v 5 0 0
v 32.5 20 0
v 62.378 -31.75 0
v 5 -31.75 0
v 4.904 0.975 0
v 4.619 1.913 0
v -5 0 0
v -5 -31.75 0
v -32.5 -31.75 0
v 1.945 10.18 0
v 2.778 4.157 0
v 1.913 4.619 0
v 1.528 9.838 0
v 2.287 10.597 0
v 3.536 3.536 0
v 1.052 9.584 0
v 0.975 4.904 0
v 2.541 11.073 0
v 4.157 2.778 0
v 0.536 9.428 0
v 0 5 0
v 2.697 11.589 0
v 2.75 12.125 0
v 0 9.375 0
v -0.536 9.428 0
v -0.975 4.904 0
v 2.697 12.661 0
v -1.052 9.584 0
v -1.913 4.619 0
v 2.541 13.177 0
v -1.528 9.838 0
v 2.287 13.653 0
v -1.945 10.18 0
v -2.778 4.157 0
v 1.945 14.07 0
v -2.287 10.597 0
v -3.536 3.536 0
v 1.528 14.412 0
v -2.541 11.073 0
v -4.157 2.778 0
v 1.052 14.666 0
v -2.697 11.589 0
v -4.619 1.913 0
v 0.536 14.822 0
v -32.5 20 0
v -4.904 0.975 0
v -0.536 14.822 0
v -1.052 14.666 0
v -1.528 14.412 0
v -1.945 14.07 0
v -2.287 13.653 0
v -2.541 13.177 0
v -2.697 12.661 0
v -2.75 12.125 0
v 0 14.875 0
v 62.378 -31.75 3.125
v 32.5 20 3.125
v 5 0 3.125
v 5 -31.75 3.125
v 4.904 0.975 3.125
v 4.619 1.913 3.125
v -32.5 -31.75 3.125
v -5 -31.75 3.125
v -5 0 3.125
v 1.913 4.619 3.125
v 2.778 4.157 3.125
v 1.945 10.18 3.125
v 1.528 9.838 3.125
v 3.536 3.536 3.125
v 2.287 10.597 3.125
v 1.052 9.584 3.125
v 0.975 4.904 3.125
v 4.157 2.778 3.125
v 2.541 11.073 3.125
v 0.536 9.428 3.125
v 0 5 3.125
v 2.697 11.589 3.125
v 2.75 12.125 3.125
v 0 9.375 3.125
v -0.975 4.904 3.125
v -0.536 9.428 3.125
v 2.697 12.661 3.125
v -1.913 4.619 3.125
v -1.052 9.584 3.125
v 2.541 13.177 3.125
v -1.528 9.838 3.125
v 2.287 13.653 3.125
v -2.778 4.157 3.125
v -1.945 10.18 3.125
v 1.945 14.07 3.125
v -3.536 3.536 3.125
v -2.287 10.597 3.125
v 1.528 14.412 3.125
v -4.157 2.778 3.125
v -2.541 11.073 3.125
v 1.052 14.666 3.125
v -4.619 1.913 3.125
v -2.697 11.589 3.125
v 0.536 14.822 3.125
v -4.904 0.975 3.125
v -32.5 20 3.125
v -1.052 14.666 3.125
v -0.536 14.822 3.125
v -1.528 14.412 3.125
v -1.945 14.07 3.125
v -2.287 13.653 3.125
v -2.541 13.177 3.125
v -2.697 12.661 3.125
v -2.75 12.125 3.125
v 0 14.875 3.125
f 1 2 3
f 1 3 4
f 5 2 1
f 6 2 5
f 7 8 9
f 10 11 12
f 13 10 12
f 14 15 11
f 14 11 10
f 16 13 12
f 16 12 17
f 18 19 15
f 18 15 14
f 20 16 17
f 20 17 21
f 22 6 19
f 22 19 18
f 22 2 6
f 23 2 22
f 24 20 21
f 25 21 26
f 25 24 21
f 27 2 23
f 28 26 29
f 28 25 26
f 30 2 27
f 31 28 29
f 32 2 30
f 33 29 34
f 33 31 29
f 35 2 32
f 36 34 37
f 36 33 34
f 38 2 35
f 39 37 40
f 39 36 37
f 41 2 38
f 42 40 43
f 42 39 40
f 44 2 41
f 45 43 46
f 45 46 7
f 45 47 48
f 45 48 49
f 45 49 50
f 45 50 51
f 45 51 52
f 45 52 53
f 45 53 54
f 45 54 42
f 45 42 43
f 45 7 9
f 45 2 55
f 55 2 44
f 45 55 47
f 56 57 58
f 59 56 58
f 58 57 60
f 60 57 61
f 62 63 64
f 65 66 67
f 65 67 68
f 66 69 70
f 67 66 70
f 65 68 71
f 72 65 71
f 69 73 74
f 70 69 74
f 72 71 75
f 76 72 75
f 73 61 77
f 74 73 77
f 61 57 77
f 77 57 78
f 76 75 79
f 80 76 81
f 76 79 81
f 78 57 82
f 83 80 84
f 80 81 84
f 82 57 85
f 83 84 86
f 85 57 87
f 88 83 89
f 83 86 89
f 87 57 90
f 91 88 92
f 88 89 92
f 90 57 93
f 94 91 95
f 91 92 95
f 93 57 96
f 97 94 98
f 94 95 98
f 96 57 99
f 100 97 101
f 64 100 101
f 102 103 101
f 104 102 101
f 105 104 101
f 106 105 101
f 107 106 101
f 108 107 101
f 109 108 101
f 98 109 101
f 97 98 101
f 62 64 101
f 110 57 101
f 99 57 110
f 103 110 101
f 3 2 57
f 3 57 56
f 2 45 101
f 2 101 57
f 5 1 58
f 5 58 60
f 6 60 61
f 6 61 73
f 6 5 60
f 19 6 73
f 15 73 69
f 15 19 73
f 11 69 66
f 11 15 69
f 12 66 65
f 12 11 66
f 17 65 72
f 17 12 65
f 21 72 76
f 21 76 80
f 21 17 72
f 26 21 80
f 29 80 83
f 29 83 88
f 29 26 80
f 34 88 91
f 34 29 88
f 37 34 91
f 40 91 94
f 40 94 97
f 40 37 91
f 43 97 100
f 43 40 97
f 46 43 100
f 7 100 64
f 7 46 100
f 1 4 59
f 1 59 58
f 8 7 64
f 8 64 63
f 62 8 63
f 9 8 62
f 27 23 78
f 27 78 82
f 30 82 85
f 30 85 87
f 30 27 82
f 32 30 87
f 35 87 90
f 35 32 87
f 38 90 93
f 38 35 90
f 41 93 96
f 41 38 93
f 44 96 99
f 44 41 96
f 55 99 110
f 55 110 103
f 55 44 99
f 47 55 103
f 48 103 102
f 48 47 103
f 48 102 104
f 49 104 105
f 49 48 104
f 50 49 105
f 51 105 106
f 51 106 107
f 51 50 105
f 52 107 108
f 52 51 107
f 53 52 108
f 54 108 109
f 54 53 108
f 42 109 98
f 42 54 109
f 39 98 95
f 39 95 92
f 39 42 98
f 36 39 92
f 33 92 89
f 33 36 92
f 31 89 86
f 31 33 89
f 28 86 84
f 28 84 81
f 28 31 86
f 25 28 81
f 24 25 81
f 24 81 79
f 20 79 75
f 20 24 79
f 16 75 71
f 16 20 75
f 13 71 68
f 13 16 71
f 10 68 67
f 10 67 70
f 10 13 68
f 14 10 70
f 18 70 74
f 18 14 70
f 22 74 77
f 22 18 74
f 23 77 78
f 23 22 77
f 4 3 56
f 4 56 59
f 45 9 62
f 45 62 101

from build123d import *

# Parameters (mm, degrees)
SKETCH1_R           = 2.75
BOSS_EXTRUDE1_DEPTH = 3.125


with BuildPart() as part:
    # Sketch1 → Boss-Extrude1 (new body)
    with BuildSketch(Plane.XY):
        with BuildLine():
            Line((-32.5, 20), (32.5, 20))
            Line((32.5, 20), (62.377876431, -31.75))
            Line((62.377876431, -31.75), (32.5, -31.75))
            Line((32.5, -31.75), (5, -31.75))
            Line((5, -31.75), (5, 0))
            ThreePointArc((5, 0), (0, 5), (-5, 0))
            Line((-5, 0), (-5, -31.75))
            Line((-5, -31.75), (-32.5, -31.75))
            Line((-32.5, -31.75), (-32.5, 20))
        make_face()
        with Locations((0, 12.125)):
            Circle(SKETCH1_R, mode=Mode.SUBTRACT)
    extrude(amount=BOSS_EXTRUDE1_DEPTH)


solid = part.part
